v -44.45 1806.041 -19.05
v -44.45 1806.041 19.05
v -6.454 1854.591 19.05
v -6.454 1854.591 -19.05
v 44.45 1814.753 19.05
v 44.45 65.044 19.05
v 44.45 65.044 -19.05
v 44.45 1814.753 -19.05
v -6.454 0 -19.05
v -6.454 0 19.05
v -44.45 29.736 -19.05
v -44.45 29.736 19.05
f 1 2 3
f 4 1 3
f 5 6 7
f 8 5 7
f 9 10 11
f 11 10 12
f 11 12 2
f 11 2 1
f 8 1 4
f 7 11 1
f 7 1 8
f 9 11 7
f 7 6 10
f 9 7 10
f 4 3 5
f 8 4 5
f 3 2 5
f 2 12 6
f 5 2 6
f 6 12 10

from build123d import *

# Parameters (mm, degrees)
SKETCH1_W           = 88.9
SKETCH1_H           = 38.1
BOSS_EXTRUDE1_DEPTH = 2032
CUT_EXTRUDE2_DEPTH  = 39.1
CUT_EXTRUDE3_DEPTH  = 39.1


with BuildPart() as part:
    # Sketch1 → Boss-Extrude1 (new body)
    with BuildSketch(Plane(origin=(0, 0, 0), x_dir=(1, 0, 0), z_dir=(0, 1, 0))):
        Rectangle(SKETCH1_W, SKETCH1_H)
    extrude(amount=BOSS_EXTRUDE1_DEPTH)

    # Sketch2 → Cut-Extrude2 (cut, through all)
    with BuildSketch(Plane.XY.offset(19.05)):
        Polygon((-44.45, 1806.041104583), (-6.454118941, 1854.591397047), (44.45, 1814.753390919), (44.45, 2032), (-44.45, 2032), align=None)
    extrude(amount=-CUT_EXTRUDE2_DEPTH, mode=Mode.SUBTRACT)

    # Sketch3 → Cut-Extrude3 (cut, through all)
    with BuildSketch(Plane.XY.offset(19.05)):
        Polygon((44.45, 65.04415198), (-6.454118941, 0), (-44.45, 29.735906916), (-64.239470553, 4.449361209), (31.244243748, -54.430099769), (82.106502152, 35.573845948), align=None)
    extrude(amount=-CUT_EXTRUDE3_DEPTH, mode=Mode.SUBTRACT)


solid = part.part
